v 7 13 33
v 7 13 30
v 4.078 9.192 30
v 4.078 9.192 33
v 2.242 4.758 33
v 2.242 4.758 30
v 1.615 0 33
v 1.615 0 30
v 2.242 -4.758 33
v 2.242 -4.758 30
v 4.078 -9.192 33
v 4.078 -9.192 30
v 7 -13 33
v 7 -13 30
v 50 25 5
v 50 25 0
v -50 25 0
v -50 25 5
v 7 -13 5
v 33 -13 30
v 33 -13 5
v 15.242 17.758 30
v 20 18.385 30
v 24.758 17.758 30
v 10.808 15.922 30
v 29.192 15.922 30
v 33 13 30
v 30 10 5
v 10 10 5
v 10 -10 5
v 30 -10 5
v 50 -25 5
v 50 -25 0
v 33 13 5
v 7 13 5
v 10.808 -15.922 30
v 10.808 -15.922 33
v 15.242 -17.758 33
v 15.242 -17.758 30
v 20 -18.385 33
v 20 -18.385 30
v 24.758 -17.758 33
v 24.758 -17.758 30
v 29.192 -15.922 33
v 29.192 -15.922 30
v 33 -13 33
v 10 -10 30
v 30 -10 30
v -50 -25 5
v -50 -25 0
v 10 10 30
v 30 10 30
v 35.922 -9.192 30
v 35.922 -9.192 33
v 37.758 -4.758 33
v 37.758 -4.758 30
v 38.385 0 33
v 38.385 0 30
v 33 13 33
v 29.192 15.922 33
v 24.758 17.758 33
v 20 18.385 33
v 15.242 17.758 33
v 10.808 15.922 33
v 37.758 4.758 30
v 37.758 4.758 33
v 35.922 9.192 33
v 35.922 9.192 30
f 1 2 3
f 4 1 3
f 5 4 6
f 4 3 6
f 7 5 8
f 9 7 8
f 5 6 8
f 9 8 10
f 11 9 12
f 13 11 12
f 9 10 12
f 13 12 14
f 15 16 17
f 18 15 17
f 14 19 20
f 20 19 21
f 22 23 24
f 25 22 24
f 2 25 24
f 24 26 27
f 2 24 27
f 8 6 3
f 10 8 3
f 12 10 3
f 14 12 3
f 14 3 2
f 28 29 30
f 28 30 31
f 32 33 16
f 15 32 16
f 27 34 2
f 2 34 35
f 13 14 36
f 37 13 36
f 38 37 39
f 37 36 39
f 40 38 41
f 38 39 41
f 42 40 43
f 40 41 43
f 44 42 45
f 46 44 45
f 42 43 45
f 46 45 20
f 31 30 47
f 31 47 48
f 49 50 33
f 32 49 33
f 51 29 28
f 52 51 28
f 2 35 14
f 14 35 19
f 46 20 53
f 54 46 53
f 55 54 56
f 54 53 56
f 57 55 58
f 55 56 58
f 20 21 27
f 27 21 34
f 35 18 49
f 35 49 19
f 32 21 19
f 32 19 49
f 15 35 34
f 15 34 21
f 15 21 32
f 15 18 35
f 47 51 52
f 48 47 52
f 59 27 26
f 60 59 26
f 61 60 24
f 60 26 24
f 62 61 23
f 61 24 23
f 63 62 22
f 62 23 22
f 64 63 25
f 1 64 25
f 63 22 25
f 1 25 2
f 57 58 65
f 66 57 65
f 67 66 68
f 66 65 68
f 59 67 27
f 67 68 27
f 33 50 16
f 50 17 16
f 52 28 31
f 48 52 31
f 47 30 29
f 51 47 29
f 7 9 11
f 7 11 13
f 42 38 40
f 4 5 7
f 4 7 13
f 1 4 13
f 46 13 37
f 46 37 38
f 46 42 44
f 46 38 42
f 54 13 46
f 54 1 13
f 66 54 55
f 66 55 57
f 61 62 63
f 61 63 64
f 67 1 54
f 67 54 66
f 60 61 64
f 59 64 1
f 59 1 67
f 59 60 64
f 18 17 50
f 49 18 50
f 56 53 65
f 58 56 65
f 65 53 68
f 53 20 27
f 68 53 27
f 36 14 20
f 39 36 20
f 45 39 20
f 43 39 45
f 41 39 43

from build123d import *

# Parameters (mm, degrees)
F0_W     = 20
F0_H     = 12
F0_H_2   = 20
F0_W_2   = 17
F0_H_3   = 3
F0_W_3   = 3
F0_W_4   = 10.8891367149
F0_H_4   = 26
F1_DEPTH = 5
F2_DEPTH = 30
F4_DEPTH = 3


# Not quite as in the source:
# - a feature names something its author has since deleted; it is built from what else it names


with BuildPart() as f1:
    # F0 (on Top) → F1 (new body)
    with BuildSketch(Plane.XY):
        Polygon((-50, 25), (-50, -25), (-3.8891367149, -25), (-3.8891367149, -13), (-3.8891367149, 13), (-3.8891367149, 25), align=None)
        Polygon((-3.8891367149, -13), (-3.8891367149, -25), (10, -25), (10, -13), (7, -13), align=None)
        with Locations((20, -19)):
            Rectangle(F0_W, F0_H)
        Polygon((30, -13), (30, -25), (50, -25), (50, -13), (33, -13), align=None)
        Polygon((50, 25), (30, 25), (30, 13), (33, 13), (50, 13), align=None)
        with Locations((20, 0)):
            Rectangle(F0_W, F0_H_2)
        with Locations((41.5, 0)):
            Rectangle(F0_W_2, F0_H_2)
        with Locations((20, 19)):
            Rectangle(F0_W, F0_H)
        with Locations((20, 11.5)):
            Rectangle(F0_W, F0_H_3)
        with Locations((31.5, 11.5)):
            Rectangle(F0_W_3, F0_H_3)
        with Locations((41.5, 11.5)):
            Rectangle(F0_W_2, F0_H_3)
        with Locations((31.5, 0)):
            Rectangle(F0_W_3, F0_H_2)
        with Locations((41.5, -11.5)):
            Rectangle(F0_W_2, F0_H_3)
        with Locations((31.5, -11.5)):
            Rectangle(F0_W_3, F0_H_3)
        with Locations((20, -11.5)):
            Rectangle(F0_W, F0_H_3)
        with Locations((1.5554316426, 0)):
            Rectangle(F0_W_4, F0_H_4)
        Polygon((10, 25), (-3.8891367149, 25), (-3.8891367149, 13), (7, 13), (10, 13), align=None)
        Polygon((7, -13), (10, -13), (10, -10), (10, 10), (10, 13), (7, 13), align=None)
    extrude(amount=F1_DEPTH)

    # F0 (on Top) → F2 (join)
    with BuildSketch(Plane.XY):
        with Locations((20, 11.5)):
            Rectangle(F0_W, F0_H_3)
        with Locations((31.5, 11.5)):
            Rectangle(F0_W_3, F0_H_3)
        with Locations((31.5, 0)):
            Rectangle(F0_W_3, F0_H_2)
        with Locations((31.5, -11.5)):
            Rectangle(F0_W_3, F0_H_3)
        with Locations((20, -11.5)):
            Rectangle(F0_W, F0_H_3)
        Polygon((7, -13), (10, -13), (10, -10), (10, 10), (10, 13), (7, 13), align=None)
    extrude(amount=F2_DEPTH)

    # F3 (on face) → F4 (join)
    with BuildSketch(Plane.XY.offset(30)):
        with BuildLine():
            ThreePointArc((38.3847763109, 0), (36.9853185434, 7.0355493019), (33, 13))
            Line((33, 13), (20, 0))
            Line((20, 0), (33, -13))
            ThreePointArc((33, -13), (36.9853185434, -7.0355493019), (38.3847763109, 0))
        make_face()
        with BuildLine():
            Line((20, 0), (33, 13))
            ThreePointArc((33, 13), (20, 18.3847763109), (7, 13))
            Line((7, 13), (20, 0))
        make_face()
        with BuildLine():
            Line((33, -13), (20, 0))
            Line((20, 0), (7, -13))
            ThreePointArc((7, -13), (20, -18.3847763109), (33, -13))
        make_face()
        Polygon((7, -13), (20, 0), (7, 13), align=None)
        with BuildLine():
            Line((7, -13), (7, 13))
            ThreePointArc((7, 13), (1.6152236891, 0), (7, -13))
        make_face()
    extrude(amount=F4_DEPTH)


solid = f1.part
